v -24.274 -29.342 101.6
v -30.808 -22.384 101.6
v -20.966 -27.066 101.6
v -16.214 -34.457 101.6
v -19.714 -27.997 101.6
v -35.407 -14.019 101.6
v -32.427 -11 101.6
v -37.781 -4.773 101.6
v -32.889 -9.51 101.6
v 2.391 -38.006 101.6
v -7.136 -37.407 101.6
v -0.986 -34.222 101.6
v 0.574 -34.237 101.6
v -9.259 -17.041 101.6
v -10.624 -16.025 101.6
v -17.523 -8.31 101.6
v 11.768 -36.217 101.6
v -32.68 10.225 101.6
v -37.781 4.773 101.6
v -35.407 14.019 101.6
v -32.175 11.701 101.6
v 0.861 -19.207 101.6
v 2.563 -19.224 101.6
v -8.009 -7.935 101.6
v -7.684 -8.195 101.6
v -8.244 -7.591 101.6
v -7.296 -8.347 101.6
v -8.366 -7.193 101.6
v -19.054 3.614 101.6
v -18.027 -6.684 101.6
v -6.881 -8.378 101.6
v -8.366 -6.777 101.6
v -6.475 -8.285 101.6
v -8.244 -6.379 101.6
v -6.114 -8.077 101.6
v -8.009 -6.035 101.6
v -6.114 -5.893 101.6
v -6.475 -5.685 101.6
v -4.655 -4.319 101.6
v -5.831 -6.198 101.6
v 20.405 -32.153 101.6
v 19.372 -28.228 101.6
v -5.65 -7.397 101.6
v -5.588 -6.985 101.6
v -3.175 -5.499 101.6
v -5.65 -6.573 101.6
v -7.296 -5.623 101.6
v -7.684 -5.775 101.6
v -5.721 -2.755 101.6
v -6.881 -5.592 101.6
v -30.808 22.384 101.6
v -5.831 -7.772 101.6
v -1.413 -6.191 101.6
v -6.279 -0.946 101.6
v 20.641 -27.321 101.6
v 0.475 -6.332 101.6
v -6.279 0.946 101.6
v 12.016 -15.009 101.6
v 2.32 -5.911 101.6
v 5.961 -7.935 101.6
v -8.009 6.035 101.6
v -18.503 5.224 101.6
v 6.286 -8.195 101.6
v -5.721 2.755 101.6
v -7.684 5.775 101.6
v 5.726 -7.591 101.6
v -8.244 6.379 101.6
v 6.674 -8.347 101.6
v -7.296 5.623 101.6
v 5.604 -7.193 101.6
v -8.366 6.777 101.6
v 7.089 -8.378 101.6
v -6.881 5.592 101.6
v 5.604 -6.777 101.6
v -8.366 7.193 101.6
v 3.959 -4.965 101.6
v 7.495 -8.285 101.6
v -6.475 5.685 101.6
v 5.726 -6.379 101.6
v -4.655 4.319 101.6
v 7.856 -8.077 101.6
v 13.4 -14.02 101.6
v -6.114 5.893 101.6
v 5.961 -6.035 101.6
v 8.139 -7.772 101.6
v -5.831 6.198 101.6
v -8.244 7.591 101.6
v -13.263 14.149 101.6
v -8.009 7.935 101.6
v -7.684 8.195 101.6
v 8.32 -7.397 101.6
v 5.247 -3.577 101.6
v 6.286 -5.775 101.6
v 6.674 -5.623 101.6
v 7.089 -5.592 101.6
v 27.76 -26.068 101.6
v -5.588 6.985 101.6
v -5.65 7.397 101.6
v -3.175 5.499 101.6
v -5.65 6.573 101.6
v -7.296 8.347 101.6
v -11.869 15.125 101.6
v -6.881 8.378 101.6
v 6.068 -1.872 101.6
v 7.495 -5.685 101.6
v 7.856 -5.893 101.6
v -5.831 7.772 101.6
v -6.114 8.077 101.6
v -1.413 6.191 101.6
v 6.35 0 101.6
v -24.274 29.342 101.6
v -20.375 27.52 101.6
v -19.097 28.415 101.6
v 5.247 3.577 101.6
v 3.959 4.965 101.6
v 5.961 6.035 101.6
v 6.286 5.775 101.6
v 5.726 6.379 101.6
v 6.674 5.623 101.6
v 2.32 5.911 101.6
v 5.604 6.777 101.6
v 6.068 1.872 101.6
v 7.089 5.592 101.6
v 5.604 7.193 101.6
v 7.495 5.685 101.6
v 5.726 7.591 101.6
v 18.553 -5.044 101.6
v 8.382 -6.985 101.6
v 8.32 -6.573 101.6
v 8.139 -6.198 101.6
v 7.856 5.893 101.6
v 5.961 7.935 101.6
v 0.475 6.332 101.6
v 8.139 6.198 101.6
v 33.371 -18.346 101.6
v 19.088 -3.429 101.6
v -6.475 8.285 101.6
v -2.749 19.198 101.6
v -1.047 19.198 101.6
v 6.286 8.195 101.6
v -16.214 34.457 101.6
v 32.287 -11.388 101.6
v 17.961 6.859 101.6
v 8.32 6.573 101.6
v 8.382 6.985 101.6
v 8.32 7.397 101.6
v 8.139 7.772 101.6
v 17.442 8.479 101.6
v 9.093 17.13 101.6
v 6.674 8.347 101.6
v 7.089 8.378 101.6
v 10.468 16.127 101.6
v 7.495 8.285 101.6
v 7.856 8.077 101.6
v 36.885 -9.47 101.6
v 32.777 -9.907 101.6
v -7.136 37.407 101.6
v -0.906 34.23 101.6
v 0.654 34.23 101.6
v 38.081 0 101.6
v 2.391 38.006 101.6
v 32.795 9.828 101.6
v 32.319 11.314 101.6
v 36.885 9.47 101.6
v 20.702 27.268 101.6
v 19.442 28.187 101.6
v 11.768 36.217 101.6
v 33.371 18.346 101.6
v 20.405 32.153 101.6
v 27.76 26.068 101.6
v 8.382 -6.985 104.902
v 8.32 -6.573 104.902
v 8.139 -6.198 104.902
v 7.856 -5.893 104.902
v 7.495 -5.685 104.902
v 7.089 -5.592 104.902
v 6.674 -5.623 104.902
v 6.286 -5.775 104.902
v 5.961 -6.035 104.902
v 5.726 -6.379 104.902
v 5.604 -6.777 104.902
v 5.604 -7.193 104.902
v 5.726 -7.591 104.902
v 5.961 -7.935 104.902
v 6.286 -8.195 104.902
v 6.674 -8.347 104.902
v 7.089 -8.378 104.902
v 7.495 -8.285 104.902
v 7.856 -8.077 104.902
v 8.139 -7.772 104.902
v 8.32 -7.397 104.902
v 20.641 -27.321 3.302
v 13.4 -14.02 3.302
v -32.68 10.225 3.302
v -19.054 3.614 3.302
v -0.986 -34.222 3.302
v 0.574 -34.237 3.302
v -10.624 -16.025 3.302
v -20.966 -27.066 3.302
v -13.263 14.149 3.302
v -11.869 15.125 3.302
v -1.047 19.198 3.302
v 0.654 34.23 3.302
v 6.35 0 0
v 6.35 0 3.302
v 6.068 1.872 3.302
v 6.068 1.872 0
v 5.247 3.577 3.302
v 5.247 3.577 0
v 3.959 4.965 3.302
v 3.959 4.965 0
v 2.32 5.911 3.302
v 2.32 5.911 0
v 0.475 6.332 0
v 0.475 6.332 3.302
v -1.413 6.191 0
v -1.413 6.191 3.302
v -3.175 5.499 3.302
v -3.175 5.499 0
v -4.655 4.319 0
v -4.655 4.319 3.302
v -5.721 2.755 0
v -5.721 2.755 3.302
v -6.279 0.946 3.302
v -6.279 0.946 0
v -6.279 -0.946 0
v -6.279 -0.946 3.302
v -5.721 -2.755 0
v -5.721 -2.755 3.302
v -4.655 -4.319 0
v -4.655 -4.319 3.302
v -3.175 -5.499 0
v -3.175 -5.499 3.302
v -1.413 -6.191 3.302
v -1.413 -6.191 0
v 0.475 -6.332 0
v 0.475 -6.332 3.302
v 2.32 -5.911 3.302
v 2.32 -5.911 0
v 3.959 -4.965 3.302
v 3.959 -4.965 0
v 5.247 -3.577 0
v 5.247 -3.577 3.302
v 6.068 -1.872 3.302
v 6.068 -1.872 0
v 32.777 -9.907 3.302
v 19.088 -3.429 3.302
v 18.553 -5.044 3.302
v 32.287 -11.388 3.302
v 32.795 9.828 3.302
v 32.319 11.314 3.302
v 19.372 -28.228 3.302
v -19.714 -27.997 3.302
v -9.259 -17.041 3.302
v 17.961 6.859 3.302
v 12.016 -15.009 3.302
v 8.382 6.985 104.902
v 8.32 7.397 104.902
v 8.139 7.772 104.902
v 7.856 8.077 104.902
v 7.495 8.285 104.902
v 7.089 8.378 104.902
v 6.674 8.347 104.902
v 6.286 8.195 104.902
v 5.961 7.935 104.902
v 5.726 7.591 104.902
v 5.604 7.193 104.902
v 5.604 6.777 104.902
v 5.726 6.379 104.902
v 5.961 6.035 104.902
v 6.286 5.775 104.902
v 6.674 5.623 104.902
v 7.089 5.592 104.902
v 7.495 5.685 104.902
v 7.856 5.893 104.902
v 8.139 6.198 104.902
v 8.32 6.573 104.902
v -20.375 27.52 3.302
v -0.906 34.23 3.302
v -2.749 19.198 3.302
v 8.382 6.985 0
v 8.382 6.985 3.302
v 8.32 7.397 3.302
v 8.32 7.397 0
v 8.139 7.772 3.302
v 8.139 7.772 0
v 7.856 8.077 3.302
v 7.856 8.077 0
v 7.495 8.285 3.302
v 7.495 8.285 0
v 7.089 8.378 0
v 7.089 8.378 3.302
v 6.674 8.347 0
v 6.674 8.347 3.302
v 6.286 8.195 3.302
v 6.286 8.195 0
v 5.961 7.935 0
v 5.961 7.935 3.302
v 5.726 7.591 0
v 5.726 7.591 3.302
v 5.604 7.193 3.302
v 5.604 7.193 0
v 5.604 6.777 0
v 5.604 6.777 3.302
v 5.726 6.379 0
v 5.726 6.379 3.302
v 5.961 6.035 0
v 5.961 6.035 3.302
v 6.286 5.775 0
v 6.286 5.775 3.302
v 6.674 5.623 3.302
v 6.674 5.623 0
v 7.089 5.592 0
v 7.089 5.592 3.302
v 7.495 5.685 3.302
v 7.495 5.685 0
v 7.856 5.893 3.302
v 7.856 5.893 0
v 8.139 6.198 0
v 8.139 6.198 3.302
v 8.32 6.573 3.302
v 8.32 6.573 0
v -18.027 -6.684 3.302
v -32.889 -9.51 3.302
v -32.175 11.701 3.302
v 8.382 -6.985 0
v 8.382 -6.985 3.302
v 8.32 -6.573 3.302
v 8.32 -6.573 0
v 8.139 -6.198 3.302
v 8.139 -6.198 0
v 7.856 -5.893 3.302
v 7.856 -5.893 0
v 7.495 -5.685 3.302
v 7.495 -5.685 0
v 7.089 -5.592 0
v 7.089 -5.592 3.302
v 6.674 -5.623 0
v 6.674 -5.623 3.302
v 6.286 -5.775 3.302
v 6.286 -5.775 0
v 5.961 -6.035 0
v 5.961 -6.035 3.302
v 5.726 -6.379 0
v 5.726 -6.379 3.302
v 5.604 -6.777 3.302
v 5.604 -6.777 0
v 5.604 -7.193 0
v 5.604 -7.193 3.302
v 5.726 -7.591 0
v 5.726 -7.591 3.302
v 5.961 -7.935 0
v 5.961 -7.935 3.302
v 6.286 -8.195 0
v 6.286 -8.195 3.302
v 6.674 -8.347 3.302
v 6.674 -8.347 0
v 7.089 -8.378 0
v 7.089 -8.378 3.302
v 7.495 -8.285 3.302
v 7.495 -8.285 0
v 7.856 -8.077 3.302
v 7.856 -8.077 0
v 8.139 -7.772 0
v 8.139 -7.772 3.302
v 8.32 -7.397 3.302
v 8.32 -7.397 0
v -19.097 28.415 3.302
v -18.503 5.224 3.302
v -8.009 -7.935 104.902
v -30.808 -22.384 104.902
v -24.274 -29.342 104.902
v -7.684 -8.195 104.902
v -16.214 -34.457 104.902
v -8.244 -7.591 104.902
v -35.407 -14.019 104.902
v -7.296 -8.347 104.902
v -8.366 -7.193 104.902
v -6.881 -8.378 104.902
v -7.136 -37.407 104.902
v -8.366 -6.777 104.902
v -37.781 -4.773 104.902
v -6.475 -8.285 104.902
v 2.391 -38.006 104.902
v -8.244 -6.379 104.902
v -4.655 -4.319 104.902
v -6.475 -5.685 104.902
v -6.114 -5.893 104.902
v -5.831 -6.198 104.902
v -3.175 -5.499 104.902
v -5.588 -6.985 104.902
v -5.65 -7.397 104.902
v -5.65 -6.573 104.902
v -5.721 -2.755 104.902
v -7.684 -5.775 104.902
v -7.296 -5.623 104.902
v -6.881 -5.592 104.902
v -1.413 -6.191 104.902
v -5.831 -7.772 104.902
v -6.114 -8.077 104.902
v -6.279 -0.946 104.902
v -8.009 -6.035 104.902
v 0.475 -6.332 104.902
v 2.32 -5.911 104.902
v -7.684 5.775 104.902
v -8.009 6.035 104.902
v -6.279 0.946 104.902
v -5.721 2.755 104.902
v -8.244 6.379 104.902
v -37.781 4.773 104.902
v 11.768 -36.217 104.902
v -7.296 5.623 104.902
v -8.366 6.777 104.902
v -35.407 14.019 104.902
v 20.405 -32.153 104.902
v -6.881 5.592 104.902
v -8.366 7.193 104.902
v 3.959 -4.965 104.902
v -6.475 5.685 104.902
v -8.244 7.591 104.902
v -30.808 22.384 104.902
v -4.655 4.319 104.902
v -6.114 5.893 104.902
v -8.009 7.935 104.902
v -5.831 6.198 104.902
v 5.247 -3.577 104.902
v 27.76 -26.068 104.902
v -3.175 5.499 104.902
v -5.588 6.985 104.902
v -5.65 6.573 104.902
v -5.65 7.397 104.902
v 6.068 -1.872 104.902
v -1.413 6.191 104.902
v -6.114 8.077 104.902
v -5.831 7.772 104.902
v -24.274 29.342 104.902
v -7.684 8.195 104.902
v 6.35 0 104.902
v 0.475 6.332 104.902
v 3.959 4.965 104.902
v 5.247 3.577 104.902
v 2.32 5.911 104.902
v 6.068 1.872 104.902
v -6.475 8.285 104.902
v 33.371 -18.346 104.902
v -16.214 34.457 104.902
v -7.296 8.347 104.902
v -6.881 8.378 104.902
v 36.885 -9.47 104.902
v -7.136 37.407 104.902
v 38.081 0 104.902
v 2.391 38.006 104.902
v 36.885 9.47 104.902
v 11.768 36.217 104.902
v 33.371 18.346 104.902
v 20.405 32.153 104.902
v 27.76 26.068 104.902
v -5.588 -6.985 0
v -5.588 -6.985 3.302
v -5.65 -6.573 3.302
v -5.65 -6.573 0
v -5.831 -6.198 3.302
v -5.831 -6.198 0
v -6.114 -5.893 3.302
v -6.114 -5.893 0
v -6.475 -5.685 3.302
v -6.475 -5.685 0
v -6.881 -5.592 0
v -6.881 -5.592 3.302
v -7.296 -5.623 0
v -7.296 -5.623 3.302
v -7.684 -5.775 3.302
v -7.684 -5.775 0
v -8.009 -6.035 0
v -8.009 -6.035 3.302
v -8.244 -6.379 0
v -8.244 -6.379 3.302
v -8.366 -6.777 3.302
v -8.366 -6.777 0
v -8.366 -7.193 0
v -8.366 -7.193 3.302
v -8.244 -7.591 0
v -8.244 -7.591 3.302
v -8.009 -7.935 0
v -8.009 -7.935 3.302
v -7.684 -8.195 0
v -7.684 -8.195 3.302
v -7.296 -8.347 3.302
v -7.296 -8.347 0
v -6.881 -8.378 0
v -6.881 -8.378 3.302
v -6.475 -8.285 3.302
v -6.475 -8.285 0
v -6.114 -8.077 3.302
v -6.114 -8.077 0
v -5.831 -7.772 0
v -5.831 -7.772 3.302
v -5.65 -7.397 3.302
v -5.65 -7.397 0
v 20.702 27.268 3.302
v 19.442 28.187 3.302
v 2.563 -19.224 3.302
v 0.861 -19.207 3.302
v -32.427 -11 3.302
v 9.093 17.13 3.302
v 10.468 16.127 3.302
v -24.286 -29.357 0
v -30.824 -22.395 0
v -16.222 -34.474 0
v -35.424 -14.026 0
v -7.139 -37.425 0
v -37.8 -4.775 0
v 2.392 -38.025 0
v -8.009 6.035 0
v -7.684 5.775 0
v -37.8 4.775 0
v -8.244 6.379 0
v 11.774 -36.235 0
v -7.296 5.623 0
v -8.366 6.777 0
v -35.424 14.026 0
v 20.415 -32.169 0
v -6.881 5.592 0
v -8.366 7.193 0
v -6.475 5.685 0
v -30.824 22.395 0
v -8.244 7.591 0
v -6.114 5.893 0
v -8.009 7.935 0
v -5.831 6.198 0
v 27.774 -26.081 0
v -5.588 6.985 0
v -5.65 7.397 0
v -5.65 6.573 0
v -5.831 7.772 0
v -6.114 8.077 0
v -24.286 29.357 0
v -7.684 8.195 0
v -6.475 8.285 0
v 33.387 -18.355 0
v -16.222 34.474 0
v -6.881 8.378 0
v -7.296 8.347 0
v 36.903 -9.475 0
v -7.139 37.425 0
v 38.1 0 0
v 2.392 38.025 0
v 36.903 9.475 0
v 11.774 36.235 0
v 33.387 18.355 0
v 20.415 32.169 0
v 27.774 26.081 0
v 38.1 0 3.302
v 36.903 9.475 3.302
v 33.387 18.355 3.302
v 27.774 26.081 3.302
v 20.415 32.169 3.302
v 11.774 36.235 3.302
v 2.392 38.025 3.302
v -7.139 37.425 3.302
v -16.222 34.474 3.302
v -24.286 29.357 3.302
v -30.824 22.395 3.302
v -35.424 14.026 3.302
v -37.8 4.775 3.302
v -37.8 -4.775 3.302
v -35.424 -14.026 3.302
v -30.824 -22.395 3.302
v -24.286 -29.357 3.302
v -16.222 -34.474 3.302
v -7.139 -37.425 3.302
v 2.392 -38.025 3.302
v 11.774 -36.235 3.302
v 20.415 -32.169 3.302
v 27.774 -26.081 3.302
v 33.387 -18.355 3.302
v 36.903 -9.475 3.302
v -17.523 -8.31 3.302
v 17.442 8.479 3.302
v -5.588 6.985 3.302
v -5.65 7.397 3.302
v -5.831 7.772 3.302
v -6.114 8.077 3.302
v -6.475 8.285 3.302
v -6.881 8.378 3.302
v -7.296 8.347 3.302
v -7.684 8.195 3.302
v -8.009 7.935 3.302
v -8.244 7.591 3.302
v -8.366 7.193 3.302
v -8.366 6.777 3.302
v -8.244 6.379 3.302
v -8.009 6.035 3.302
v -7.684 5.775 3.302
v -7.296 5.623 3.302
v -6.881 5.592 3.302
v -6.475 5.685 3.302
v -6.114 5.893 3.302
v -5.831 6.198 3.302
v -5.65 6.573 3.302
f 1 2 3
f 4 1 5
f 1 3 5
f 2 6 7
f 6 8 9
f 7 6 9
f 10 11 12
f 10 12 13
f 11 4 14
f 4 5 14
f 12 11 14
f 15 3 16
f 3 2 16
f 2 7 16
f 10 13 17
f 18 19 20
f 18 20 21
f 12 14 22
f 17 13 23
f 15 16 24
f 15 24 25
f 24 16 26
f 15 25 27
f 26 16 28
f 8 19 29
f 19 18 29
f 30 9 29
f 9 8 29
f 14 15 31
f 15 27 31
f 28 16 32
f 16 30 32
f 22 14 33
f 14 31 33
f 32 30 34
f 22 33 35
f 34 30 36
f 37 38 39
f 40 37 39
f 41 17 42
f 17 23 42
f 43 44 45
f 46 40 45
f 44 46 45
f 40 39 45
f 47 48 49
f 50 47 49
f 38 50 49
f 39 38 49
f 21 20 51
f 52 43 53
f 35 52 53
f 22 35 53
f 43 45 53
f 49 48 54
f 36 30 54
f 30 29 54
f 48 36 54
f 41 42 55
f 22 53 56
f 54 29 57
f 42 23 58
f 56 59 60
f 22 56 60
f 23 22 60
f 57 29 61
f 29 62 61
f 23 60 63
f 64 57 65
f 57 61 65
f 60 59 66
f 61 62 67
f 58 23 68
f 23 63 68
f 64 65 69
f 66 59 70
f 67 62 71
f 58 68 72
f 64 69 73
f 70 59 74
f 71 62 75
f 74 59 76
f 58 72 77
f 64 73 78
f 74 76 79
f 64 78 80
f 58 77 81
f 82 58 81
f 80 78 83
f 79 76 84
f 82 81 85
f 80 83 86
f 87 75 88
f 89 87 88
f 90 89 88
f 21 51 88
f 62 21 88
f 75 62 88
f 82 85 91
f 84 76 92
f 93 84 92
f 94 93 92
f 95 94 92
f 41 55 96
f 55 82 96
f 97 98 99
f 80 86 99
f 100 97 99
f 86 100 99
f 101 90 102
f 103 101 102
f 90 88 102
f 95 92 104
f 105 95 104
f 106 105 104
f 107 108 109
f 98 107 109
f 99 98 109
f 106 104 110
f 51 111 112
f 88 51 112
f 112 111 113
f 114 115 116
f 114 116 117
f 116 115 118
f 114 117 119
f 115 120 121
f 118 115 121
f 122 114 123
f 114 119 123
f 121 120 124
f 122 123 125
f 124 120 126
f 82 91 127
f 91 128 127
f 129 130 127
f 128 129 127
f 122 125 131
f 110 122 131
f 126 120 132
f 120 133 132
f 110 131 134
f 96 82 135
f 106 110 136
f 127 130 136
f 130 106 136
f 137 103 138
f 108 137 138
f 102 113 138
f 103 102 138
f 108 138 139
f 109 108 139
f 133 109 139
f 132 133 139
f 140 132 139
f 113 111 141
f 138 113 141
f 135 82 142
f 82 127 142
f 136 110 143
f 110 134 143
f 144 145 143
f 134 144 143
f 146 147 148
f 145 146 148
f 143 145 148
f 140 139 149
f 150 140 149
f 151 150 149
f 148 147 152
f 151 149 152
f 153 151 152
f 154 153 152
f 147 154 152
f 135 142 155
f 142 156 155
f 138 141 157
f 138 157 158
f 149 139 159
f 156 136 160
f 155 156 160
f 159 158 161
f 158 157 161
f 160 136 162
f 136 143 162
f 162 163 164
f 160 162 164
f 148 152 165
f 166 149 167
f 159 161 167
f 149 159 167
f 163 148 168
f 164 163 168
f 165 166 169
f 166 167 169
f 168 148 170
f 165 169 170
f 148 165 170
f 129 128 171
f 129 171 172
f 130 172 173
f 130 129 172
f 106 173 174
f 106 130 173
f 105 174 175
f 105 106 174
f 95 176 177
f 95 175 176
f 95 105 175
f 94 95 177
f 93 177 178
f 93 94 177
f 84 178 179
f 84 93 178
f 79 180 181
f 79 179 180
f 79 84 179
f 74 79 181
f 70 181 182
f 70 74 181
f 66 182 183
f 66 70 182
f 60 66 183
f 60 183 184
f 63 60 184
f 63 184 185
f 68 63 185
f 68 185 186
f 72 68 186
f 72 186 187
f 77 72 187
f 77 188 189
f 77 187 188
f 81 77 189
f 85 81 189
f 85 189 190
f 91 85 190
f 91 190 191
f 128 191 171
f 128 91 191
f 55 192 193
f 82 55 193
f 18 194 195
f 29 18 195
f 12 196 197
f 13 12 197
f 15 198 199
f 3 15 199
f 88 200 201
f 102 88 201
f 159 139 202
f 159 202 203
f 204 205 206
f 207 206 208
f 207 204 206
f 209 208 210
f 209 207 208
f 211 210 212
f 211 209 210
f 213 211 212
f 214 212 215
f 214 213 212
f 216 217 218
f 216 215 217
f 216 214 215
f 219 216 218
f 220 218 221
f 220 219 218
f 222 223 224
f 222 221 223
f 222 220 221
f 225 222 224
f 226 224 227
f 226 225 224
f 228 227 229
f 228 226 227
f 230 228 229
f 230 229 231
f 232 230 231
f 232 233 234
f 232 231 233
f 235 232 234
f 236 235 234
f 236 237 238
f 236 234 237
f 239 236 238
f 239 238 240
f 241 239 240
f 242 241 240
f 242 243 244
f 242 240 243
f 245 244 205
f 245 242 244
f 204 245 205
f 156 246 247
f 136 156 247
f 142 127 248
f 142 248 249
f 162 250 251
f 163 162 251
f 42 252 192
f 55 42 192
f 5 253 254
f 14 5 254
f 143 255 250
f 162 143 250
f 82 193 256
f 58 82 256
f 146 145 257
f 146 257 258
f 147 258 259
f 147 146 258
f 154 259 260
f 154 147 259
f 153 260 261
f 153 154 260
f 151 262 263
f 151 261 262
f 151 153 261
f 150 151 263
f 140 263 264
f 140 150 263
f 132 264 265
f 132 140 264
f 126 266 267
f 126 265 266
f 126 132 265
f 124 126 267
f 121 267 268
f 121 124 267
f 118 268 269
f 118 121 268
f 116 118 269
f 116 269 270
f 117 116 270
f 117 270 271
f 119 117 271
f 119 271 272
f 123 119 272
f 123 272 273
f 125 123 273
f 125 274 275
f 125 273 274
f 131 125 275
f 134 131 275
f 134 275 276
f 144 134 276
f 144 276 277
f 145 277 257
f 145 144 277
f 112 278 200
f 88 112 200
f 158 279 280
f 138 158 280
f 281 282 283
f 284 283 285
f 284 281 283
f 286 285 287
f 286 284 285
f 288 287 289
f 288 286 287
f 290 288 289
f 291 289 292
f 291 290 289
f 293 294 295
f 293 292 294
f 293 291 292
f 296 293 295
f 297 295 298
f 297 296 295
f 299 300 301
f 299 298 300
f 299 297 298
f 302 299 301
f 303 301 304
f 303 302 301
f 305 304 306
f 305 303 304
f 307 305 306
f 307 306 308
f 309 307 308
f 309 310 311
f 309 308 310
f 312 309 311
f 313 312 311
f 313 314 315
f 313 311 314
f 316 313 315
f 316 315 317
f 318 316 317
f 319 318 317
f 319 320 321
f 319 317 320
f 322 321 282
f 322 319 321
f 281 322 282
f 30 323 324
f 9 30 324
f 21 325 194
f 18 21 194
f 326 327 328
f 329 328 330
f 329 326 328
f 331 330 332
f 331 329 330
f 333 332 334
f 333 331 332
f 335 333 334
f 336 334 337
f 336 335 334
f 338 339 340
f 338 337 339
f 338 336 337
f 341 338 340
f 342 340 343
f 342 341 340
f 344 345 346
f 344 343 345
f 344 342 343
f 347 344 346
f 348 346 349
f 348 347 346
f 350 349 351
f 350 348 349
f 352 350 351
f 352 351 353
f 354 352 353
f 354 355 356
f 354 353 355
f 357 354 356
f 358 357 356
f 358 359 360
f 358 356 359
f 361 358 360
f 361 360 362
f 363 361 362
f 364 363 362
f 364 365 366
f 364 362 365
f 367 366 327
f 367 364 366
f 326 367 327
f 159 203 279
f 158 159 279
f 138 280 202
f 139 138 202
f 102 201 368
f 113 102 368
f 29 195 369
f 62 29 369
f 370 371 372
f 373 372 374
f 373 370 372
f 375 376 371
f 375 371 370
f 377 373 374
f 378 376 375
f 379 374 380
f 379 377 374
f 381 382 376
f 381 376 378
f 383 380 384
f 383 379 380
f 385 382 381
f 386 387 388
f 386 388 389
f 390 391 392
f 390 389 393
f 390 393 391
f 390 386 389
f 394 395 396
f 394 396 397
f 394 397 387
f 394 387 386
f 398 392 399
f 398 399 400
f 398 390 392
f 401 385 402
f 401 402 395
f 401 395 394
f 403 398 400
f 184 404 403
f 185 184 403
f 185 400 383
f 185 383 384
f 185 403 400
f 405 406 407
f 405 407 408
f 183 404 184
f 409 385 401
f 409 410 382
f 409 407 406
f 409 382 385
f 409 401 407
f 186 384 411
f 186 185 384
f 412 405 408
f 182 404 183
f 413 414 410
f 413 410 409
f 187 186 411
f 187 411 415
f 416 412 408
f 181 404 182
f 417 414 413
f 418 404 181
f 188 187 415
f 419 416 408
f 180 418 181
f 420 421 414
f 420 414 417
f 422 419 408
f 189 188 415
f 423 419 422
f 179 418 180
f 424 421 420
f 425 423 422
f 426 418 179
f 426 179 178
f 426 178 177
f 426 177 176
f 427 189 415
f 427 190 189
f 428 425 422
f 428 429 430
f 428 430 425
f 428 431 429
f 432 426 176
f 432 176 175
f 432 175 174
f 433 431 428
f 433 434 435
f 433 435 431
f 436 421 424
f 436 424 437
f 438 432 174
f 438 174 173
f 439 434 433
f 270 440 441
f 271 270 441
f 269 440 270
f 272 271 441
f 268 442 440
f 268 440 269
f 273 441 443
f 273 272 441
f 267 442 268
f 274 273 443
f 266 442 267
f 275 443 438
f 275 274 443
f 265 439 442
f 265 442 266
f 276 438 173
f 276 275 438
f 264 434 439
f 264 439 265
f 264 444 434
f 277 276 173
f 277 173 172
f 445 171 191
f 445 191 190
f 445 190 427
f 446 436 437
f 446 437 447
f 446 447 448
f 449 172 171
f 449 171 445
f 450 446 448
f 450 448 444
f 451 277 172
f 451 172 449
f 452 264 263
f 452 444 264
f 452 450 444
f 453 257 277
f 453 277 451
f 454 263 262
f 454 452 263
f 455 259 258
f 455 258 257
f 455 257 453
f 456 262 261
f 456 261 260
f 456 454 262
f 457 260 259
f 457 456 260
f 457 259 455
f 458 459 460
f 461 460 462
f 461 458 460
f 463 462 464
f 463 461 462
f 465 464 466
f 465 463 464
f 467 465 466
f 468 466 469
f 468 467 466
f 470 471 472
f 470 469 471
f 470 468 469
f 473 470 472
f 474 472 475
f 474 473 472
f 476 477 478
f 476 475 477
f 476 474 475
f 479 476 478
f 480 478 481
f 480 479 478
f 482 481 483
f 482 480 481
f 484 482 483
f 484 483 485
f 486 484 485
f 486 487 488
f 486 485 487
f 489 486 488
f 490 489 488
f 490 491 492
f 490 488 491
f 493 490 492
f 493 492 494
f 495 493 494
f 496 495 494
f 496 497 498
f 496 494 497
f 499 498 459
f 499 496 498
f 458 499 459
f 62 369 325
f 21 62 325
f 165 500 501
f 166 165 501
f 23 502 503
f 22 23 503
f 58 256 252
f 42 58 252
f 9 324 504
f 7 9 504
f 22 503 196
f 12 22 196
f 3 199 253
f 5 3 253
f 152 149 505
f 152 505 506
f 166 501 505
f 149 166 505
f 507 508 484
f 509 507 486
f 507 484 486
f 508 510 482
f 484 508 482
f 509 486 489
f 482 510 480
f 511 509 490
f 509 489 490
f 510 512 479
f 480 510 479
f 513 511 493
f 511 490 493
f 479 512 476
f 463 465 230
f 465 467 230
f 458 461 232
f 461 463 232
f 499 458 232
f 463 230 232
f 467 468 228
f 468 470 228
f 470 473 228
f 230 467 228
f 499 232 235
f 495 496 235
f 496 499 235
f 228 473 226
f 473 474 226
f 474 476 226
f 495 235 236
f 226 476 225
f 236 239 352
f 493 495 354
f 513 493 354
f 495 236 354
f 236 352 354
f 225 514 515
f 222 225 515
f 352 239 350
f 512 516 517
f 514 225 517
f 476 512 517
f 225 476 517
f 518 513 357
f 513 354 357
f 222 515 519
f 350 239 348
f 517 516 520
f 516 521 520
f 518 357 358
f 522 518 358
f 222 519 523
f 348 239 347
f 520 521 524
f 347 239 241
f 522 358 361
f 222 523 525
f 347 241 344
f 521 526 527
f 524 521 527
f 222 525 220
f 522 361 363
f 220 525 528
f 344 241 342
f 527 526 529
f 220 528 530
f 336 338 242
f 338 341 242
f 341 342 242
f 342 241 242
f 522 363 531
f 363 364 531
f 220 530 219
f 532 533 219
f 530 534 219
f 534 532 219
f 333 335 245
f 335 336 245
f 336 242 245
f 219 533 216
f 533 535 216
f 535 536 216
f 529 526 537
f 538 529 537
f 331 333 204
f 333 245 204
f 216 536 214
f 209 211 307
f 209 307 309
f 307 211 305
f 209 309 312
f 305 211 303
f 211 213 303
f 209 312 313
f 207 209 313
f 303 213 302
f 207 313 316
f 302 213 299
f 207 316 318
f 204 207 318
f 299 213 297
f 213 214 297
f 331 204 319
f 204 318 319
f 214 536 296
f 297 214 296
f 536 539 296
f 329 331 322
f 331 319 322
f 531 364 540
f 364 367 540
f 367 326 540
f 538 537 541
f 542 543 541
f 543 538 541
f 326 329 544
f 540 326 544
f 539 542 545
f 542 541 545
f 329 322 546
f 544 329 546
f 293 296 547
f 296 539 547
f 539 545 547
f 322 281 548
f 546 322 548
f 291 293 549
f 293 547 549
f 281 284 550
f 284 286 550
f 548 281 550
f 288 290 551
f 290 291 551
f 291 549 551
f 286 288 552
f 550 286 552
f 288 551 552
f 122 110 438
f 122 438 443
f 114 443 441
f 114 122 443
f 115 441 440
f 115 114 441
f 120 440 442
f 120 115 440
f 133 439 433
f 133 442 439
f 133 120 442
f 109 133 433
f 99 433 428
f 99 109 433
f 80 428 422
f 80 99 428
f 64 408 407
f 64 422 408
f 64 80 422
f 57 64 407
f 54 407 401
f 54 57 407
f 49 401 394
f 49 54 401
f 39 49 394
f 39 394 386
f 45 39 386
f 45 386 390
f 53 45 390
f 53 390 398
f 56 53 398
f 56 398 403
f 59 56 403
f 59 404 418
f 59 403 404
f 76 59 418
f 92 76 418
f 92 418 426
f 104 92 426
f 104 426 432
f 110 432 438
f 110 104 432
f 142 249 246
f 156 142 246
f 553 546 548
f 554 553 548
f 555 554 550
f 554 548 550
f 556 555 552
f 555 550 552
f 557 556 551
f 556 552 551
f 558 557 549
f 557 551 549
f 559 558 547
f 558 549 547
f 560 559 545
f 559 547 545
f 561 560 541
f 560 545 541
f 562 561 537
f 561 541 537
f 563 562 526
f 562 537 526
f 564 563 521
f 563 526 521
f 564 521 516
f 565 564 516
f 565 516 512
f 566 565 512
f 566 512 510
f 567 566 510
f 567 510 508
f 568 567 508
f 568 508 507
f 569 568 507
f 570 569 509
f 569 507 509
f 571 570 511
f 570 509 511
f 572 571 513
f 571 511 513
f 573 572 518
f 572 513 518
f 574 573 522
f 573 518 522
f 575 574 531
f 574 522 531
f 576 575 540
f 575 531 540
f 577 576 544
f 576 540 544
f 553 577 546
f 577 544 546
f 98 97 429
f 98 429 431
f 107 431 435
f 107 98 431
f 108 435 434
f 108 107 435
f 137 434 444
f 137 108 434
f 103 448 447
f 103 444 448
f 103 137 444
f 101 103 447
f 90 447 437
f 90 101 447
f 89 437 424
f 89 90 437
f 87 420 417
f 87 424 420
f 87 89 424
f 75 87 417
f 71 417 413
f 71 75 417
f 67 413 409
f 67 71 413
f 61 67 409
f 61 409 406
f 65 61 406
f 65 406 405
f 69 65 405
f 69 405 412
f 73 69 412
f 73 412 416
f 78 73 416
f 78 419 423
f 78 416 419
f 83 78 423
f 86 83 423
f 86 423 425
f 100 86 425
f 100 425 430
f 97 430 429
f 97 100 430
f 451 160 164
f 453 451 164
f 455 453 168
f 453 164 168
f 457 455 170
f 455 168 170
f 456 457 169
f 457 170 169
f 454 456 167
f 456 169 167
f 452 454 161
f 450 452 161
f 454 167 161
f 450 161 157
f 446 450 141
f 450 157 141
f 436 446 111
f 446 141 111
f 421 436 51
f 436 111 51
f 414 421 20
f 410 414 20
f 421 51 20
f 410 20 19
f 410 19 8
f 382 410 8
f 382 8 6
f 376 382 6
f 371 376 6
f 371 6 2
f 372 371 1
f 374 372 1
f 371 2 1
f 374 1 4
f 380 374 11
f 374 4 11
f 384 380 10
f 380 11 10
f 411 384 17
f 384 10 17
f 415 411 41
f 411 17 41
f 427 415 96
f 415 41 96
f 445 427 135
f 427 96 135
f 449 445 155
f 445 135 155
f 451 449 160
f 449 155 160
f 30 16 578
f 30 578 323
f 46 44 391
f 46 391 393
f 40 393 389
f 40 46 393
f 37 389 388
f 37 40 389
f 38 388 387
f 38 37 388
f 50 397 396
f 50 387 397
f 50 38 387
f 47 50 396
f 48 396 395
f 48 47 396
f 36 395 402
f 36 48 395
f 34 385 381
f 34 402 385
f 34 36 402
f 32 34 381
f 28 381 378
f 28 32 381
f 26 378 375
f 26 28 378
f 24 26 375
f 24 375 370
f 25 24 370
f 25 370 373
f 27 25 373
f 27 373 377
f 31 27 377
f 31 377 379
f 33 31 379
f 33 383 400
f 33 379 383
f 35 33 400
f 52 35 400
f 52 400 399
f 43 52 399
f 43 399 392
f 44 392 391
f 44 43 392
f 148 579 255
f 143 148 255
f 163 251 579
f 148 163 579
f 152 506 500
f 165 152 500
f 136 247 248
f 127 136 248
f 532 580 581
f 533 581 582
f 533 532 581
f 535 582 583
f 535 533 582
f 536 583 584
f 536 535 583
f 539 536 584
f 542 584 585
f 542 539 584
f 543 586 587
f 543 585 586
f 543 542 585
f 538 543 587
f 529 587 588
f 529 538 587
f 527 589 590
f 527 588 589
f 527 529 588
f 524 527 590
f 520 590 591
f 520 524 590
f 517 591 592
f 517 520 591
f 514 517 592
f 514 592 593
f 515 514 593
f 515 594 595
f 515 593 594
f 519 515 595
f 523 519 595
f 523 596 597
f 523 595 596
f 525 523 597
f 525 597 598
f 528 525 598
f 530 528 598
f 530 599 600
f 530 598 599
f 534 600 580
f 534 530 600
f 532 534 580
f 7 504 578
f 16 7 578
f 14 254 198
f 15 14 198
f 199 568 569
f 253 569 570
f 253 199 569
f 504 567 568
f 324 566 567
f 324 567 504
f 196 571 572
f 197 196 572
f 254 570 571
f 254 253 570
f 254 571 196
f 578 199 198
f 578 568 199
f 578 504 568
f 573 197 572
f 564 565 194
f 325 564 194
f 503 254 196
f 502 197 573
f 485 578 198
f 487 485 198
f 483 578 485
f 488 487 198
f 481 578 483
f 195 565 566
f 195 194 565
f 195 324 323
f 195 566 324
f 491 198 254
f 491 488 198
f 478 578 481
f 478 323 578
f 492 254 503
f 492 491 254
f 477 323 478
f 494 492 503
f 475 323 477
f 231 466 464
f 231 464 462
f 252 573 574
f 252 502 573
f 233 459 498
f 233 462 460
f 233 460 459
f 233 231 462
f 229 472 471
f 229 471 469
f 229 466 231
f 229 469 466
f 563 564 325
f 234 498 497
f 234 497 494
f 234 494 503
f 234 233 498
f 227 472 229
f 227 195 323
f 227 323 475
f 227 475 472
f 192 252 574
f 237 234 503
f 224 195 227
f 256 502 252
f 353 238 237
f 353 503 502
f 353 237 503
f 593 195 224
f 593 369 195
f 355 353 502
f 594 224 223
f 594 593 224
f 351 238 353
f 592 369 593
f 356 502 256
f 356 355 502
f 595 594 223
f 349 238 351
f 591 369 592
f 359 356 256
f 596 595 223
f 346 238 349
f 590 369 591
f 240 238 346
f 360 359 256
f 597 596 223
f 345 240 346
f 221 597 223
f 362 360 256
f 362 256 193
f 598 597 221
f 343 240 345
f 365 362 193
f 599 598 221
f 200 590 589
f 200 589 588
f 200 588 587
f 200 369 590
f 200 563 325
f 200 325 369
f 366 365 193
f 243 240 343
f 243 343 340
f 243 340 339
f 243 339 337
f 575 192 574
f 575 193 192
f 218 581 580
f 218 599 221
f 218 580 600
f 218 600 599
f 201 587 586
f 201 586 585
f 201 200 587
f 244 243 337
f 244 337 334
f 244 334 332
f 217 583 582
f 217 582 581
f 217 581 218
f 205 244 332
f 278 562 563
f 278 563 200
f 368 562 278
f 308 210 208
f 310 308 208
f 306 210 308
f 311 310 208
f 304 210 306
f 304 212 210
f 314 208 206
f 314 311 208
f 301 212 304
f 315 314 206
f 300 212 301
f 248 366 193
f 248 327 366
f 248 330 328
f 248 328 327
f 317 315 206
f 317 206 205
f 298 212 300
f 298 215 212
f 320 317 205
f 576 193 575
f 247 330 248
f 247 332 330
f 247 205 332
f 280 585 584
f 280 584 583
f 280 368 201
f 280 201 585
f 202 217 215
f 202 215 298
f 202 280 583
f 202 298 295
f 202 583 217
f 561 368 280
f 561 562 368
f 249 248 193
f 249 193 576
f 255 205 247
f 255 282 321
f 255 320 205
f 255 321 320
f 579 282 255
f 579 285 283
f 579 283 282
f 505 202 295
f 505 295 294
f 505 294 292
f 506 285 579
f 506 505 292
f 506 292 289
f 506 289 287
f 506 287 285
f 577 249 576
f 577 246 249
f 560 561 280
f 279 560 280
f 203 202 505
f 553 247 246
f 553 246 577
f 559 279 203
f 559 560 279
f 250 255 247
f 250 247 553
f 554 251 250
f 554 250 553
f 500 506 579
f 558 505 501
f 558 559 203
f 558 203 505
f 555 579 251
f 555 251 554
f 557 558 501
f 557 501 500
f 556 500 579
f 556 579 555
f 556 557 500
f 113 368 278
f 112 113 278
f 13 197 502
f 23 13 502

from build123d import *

# Parameters (mm, degrees)
F0_R     = 38.1
F0_R_2   = 3.175
F1_DEPTH = 3.302
F2_DEPTH = 101.6
F3_R     = 38.08114
F3_R_2   = 3.175
F4_DEPTH = 3.302
F6_R     = 1.397
F6_R_2   = 6.35
F7_DEPTH = 136.906


with BuildPart() as f1:
    # F0 (on Top) → F1 (new body)
    with BuildSketch(Plane.XY):
        Circle(F0_R)
        Polygon((-19.714349, -27.997382), (-20.965572, -27.06588), (-10.624112, -16.024547), (-9.259141, -17.040731), align=None, mode=Mode.SUBTRACT)
        Polygon((-32.427083, -10.999691), (-32.888933, -9.50974), (-18.027077, -6.684488), (-17.52324, -8.309888), align=None, mode=Mode.SUBTRACT)
        Polygon((0.573601, -34.237113), (-0.986216, -34.221988), (0.861155, -19.207194), (2.562772, -19.223693), align=None, mode=Mode.SUBTRACT)
        Polygon((20.641144, -27.321275), (19.372093, -28.228339), (12.015524, -15.009499), (13.399943, -14.019975), align=None, mode=Mode.SUBTRACT)
        Polygon((32.777353, -9.907271), (32.286698, -11.387985), (18.552942, -5.044423), (19.088202, -3.429099), align=None, mode=Mode.SUBTRACT)
        Polygon((-32.679751, 10.224618), (-32.174761, 11.700505), (-18.503159, 5.224077), (-19.054056, 3.614019), align=None, mode=Mode.SUBTRACT)
        Polygon((-20.375264, 27.52013), (-19.097477, 28.414846), (-11.869425, 15.125297), (-13.263374, 14.149244), align=None, mode=Mode.SUBTRACT)
        Polygon((-2.749047, 19.197941), (-0.905541, 34.229942), (0.654349, 34.229942), (-1.04735, 19.197941), align=None, mode=Mode.SUBTRACT)
        Circle(F0_R_2, mode=Mode.SUBTRACT)
        Polygon((32.318904, 11.31359), (32.795179, 9.828188), (17.961416, 6.858967), (17.441843, 8.479405), align=None, mode=Mode.SUBTRACT)
        Polygon((19.441956, 28.187218), (20.702153, 27.267892), (10.468237, 16.126807), (9.093476, 17.129707), align=None, mode=Mode.SUBTRACT)
    extrude(amount=F1_DEPTH)

    # F0 (on Top) → F2 (join)
    with BuildSketch(Plane.XY):
        Polygon((-18.503159, 5.224077), (-32.174761, 11.700505), (-32.679751, 10.224618), (-19.054056, 3.614019), align=None)
        Polygon((-18.027077, -6.684488), (-32.888933, -9.50974), (-32.427083, -10.999691), (-17.52324, -8.309888), align=None)
        Polygon((-10.624112, -16.024547), (-20.965572, -27.06588), (-19.714349, -27.997382), (-9.259141, -17.040731), align=None)
        Polygon((0.861155, -19.207194), (-0.986216, -34.221988), (0.573601, -34.237113), (2.562772, -19.223693), align=None)
        Polygon((12.015524, -15.009499), (19.372093, -28.228339), (20.641144, -27.321275), (13.399943, -14.019975), align=None)
        Polygon((18.552942, -5.044423), (32.286698, -11.387985), (32.777353, -9.907271), (19.088202, -3.429099), align=None)
        Polygon((17.961416, 6.858967), (32.795179, 9.828188), (32.318904, 11.31359), (17.441843, 8.479405), align=None)
        Polygon((10.468237, 16.126807), (20.702153, 27.267892), (19.441956, 28.187218), (9.093476, 17.129707), align=None)
        Polygon((0.654349, 34.229942), (-0.905541, 34.229942), (-2.749047, 19.197941), (-1.04735, 19.197941), align=None)
        Polygon((-11.869425, 15.125297), (-19.097477, 28.414846), (-20.375264, 27.52013), (-13.263374, 14.149244), align=None)
    extrude(amount=F2_DEPTH)

    # F3 (on face) → F4 (join)
    with BuildSketch(Plane.XY.offset(101.6)):
        Circle(F3_R)
        Circle(F3_R_2, mode=Mode.SUBTRACT)
    extrude(amount=F4_DEPTH)

    # F6 (on face) → F7 (cut)
    with BuildSketch(Plane.XY):
        with Locations((6.985, -6.985001)):
            Circle(F6_R)
        with Locations((-6.985, -6.985001)):
            Circle(F6_R)
        with Locations((-6.985, 6.985001)):
            Circle(F6_R)
        with Locations((6.985, 6.985001)):
            Circle(F6_R)
        Circle(F6_R_2)
    extrude(amount=F7_DEPTH, mode=Mode.SUBTRACT)


solid = f1.part
